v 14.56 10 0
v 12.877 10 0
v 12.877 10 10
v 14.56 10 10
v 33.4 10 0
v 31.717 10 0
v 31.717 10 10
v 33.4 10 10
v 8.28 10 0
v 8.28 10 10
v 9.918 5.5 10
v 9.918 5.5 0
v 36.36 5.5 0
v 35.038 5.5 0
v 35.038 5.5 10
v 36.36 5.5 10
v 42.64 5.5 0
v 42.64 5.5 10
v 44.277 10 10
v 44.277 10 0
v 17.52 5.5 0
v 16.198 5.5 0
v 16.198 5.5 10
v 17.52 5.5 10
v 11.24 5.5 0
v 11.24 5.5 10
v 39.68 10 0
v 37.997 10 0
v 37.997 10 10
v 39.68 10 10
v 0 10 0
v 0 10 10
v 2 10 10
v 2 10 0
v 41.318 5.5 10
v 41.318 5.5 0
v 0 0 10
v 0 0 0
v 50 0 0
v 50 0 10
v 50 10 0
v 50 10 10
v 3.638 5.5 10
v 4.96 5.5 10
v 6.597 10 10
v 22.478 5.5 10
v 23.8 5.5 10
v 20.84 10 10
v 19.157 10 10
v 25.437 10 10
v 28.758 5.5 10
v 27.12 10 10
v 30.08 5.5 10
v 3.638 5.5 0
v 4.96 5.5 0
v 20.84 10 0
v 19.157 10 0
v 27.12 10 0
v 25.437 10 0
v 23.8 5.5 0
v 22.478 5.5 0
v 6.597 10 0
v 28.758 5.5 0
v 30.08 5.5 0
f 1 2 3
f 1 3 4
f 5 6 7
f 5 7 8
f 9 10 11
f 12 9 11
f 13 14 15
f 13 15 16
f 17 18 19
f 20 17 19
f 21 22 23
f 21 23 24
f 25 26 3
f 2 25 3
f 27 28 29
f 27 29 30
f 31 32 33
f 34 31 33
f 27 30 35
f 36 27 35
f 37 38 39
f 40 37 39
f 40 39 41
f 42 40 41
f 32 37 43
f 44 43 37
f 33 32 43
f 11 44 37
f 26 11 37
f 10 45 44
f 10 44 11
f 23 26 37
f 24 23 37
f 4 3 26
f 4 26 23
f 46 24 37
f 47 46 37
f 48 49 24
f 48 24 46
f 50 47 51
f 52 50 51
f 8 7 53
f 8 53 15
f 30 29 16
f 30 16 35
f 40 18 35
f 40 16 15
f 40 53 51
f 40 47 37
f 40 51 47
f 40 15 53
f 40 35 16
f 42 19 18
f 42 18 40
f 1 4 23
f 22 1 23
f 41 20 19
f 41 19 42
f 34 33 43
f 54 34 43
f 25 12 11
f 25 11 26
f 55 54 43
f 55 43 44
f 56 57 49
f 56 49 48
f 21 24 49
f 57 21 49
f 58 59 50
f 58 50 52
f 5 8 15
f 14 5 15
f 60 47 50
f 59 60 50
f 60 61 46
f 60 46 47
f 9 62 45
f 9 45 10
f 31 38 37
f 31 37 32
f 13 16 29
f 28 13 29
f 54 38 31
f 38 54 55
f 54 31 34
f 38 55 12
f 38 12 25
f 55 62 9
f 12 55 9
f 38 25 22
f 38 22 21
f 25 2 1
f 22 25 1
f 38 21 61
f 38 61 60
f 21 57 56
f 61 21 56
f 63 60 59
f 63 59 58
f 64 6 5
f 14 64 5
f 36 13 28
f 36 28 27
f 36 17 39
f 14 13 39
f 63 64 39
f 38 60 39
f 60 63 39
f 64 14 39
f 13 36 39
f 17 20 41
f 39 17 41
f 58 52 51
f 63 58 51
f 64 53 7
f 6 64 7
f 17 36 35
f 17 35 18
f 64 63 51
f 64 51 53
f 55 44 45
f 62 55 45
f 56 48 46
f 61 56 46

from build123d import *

# Parameters (mm, degrees)
SKETCH_1_W             = 50
SKETCH_1_H             = 10
EXTRUDE_1_DEPTH        = 10
CUT_EXTRUDE_1_DEPTH    = 52.961524227
PATTERN_LINEAR_1_COUNT = 7
PATTERN_LINEAR_1_PITCH = 6.28


with BuildPart() as part:
    # 草图1 → 凸台-拉伸1 (new body)
    with BuildSketch(Plane.XY):
        with Locations((25, 5)):
            Rectangle(SKETCH_1_W, SKETCH_1_H)
    extrude(amount=EXTRUDE_1_DEPTH)

    # 草图2 → 切除-拉伸1 (cut, through all)
    with BuildSketch(Plane.XY.offset(10)):
        Polygon((2, 10), (3.637866054, 5.5), (4.959614883, 5.5), (6.597480937, 10), align=None)
    cut_extrude_1 = extrude(amount=-CUT_EXTRUDE_1_DEPTH, mode=Mode.SUBTRACT)

    # 阵列(线性)1: 切除-拉伸1 ×7
    with Locations(*[(i * PATTERN_LINEAR_1_PITCH, 0, 0) for i in range(1, PATTERN_LINEAR_1_COUNT)]):
        add(cut_extrude_1, mode=Mode.SUBTRACT)


solid = part.part
